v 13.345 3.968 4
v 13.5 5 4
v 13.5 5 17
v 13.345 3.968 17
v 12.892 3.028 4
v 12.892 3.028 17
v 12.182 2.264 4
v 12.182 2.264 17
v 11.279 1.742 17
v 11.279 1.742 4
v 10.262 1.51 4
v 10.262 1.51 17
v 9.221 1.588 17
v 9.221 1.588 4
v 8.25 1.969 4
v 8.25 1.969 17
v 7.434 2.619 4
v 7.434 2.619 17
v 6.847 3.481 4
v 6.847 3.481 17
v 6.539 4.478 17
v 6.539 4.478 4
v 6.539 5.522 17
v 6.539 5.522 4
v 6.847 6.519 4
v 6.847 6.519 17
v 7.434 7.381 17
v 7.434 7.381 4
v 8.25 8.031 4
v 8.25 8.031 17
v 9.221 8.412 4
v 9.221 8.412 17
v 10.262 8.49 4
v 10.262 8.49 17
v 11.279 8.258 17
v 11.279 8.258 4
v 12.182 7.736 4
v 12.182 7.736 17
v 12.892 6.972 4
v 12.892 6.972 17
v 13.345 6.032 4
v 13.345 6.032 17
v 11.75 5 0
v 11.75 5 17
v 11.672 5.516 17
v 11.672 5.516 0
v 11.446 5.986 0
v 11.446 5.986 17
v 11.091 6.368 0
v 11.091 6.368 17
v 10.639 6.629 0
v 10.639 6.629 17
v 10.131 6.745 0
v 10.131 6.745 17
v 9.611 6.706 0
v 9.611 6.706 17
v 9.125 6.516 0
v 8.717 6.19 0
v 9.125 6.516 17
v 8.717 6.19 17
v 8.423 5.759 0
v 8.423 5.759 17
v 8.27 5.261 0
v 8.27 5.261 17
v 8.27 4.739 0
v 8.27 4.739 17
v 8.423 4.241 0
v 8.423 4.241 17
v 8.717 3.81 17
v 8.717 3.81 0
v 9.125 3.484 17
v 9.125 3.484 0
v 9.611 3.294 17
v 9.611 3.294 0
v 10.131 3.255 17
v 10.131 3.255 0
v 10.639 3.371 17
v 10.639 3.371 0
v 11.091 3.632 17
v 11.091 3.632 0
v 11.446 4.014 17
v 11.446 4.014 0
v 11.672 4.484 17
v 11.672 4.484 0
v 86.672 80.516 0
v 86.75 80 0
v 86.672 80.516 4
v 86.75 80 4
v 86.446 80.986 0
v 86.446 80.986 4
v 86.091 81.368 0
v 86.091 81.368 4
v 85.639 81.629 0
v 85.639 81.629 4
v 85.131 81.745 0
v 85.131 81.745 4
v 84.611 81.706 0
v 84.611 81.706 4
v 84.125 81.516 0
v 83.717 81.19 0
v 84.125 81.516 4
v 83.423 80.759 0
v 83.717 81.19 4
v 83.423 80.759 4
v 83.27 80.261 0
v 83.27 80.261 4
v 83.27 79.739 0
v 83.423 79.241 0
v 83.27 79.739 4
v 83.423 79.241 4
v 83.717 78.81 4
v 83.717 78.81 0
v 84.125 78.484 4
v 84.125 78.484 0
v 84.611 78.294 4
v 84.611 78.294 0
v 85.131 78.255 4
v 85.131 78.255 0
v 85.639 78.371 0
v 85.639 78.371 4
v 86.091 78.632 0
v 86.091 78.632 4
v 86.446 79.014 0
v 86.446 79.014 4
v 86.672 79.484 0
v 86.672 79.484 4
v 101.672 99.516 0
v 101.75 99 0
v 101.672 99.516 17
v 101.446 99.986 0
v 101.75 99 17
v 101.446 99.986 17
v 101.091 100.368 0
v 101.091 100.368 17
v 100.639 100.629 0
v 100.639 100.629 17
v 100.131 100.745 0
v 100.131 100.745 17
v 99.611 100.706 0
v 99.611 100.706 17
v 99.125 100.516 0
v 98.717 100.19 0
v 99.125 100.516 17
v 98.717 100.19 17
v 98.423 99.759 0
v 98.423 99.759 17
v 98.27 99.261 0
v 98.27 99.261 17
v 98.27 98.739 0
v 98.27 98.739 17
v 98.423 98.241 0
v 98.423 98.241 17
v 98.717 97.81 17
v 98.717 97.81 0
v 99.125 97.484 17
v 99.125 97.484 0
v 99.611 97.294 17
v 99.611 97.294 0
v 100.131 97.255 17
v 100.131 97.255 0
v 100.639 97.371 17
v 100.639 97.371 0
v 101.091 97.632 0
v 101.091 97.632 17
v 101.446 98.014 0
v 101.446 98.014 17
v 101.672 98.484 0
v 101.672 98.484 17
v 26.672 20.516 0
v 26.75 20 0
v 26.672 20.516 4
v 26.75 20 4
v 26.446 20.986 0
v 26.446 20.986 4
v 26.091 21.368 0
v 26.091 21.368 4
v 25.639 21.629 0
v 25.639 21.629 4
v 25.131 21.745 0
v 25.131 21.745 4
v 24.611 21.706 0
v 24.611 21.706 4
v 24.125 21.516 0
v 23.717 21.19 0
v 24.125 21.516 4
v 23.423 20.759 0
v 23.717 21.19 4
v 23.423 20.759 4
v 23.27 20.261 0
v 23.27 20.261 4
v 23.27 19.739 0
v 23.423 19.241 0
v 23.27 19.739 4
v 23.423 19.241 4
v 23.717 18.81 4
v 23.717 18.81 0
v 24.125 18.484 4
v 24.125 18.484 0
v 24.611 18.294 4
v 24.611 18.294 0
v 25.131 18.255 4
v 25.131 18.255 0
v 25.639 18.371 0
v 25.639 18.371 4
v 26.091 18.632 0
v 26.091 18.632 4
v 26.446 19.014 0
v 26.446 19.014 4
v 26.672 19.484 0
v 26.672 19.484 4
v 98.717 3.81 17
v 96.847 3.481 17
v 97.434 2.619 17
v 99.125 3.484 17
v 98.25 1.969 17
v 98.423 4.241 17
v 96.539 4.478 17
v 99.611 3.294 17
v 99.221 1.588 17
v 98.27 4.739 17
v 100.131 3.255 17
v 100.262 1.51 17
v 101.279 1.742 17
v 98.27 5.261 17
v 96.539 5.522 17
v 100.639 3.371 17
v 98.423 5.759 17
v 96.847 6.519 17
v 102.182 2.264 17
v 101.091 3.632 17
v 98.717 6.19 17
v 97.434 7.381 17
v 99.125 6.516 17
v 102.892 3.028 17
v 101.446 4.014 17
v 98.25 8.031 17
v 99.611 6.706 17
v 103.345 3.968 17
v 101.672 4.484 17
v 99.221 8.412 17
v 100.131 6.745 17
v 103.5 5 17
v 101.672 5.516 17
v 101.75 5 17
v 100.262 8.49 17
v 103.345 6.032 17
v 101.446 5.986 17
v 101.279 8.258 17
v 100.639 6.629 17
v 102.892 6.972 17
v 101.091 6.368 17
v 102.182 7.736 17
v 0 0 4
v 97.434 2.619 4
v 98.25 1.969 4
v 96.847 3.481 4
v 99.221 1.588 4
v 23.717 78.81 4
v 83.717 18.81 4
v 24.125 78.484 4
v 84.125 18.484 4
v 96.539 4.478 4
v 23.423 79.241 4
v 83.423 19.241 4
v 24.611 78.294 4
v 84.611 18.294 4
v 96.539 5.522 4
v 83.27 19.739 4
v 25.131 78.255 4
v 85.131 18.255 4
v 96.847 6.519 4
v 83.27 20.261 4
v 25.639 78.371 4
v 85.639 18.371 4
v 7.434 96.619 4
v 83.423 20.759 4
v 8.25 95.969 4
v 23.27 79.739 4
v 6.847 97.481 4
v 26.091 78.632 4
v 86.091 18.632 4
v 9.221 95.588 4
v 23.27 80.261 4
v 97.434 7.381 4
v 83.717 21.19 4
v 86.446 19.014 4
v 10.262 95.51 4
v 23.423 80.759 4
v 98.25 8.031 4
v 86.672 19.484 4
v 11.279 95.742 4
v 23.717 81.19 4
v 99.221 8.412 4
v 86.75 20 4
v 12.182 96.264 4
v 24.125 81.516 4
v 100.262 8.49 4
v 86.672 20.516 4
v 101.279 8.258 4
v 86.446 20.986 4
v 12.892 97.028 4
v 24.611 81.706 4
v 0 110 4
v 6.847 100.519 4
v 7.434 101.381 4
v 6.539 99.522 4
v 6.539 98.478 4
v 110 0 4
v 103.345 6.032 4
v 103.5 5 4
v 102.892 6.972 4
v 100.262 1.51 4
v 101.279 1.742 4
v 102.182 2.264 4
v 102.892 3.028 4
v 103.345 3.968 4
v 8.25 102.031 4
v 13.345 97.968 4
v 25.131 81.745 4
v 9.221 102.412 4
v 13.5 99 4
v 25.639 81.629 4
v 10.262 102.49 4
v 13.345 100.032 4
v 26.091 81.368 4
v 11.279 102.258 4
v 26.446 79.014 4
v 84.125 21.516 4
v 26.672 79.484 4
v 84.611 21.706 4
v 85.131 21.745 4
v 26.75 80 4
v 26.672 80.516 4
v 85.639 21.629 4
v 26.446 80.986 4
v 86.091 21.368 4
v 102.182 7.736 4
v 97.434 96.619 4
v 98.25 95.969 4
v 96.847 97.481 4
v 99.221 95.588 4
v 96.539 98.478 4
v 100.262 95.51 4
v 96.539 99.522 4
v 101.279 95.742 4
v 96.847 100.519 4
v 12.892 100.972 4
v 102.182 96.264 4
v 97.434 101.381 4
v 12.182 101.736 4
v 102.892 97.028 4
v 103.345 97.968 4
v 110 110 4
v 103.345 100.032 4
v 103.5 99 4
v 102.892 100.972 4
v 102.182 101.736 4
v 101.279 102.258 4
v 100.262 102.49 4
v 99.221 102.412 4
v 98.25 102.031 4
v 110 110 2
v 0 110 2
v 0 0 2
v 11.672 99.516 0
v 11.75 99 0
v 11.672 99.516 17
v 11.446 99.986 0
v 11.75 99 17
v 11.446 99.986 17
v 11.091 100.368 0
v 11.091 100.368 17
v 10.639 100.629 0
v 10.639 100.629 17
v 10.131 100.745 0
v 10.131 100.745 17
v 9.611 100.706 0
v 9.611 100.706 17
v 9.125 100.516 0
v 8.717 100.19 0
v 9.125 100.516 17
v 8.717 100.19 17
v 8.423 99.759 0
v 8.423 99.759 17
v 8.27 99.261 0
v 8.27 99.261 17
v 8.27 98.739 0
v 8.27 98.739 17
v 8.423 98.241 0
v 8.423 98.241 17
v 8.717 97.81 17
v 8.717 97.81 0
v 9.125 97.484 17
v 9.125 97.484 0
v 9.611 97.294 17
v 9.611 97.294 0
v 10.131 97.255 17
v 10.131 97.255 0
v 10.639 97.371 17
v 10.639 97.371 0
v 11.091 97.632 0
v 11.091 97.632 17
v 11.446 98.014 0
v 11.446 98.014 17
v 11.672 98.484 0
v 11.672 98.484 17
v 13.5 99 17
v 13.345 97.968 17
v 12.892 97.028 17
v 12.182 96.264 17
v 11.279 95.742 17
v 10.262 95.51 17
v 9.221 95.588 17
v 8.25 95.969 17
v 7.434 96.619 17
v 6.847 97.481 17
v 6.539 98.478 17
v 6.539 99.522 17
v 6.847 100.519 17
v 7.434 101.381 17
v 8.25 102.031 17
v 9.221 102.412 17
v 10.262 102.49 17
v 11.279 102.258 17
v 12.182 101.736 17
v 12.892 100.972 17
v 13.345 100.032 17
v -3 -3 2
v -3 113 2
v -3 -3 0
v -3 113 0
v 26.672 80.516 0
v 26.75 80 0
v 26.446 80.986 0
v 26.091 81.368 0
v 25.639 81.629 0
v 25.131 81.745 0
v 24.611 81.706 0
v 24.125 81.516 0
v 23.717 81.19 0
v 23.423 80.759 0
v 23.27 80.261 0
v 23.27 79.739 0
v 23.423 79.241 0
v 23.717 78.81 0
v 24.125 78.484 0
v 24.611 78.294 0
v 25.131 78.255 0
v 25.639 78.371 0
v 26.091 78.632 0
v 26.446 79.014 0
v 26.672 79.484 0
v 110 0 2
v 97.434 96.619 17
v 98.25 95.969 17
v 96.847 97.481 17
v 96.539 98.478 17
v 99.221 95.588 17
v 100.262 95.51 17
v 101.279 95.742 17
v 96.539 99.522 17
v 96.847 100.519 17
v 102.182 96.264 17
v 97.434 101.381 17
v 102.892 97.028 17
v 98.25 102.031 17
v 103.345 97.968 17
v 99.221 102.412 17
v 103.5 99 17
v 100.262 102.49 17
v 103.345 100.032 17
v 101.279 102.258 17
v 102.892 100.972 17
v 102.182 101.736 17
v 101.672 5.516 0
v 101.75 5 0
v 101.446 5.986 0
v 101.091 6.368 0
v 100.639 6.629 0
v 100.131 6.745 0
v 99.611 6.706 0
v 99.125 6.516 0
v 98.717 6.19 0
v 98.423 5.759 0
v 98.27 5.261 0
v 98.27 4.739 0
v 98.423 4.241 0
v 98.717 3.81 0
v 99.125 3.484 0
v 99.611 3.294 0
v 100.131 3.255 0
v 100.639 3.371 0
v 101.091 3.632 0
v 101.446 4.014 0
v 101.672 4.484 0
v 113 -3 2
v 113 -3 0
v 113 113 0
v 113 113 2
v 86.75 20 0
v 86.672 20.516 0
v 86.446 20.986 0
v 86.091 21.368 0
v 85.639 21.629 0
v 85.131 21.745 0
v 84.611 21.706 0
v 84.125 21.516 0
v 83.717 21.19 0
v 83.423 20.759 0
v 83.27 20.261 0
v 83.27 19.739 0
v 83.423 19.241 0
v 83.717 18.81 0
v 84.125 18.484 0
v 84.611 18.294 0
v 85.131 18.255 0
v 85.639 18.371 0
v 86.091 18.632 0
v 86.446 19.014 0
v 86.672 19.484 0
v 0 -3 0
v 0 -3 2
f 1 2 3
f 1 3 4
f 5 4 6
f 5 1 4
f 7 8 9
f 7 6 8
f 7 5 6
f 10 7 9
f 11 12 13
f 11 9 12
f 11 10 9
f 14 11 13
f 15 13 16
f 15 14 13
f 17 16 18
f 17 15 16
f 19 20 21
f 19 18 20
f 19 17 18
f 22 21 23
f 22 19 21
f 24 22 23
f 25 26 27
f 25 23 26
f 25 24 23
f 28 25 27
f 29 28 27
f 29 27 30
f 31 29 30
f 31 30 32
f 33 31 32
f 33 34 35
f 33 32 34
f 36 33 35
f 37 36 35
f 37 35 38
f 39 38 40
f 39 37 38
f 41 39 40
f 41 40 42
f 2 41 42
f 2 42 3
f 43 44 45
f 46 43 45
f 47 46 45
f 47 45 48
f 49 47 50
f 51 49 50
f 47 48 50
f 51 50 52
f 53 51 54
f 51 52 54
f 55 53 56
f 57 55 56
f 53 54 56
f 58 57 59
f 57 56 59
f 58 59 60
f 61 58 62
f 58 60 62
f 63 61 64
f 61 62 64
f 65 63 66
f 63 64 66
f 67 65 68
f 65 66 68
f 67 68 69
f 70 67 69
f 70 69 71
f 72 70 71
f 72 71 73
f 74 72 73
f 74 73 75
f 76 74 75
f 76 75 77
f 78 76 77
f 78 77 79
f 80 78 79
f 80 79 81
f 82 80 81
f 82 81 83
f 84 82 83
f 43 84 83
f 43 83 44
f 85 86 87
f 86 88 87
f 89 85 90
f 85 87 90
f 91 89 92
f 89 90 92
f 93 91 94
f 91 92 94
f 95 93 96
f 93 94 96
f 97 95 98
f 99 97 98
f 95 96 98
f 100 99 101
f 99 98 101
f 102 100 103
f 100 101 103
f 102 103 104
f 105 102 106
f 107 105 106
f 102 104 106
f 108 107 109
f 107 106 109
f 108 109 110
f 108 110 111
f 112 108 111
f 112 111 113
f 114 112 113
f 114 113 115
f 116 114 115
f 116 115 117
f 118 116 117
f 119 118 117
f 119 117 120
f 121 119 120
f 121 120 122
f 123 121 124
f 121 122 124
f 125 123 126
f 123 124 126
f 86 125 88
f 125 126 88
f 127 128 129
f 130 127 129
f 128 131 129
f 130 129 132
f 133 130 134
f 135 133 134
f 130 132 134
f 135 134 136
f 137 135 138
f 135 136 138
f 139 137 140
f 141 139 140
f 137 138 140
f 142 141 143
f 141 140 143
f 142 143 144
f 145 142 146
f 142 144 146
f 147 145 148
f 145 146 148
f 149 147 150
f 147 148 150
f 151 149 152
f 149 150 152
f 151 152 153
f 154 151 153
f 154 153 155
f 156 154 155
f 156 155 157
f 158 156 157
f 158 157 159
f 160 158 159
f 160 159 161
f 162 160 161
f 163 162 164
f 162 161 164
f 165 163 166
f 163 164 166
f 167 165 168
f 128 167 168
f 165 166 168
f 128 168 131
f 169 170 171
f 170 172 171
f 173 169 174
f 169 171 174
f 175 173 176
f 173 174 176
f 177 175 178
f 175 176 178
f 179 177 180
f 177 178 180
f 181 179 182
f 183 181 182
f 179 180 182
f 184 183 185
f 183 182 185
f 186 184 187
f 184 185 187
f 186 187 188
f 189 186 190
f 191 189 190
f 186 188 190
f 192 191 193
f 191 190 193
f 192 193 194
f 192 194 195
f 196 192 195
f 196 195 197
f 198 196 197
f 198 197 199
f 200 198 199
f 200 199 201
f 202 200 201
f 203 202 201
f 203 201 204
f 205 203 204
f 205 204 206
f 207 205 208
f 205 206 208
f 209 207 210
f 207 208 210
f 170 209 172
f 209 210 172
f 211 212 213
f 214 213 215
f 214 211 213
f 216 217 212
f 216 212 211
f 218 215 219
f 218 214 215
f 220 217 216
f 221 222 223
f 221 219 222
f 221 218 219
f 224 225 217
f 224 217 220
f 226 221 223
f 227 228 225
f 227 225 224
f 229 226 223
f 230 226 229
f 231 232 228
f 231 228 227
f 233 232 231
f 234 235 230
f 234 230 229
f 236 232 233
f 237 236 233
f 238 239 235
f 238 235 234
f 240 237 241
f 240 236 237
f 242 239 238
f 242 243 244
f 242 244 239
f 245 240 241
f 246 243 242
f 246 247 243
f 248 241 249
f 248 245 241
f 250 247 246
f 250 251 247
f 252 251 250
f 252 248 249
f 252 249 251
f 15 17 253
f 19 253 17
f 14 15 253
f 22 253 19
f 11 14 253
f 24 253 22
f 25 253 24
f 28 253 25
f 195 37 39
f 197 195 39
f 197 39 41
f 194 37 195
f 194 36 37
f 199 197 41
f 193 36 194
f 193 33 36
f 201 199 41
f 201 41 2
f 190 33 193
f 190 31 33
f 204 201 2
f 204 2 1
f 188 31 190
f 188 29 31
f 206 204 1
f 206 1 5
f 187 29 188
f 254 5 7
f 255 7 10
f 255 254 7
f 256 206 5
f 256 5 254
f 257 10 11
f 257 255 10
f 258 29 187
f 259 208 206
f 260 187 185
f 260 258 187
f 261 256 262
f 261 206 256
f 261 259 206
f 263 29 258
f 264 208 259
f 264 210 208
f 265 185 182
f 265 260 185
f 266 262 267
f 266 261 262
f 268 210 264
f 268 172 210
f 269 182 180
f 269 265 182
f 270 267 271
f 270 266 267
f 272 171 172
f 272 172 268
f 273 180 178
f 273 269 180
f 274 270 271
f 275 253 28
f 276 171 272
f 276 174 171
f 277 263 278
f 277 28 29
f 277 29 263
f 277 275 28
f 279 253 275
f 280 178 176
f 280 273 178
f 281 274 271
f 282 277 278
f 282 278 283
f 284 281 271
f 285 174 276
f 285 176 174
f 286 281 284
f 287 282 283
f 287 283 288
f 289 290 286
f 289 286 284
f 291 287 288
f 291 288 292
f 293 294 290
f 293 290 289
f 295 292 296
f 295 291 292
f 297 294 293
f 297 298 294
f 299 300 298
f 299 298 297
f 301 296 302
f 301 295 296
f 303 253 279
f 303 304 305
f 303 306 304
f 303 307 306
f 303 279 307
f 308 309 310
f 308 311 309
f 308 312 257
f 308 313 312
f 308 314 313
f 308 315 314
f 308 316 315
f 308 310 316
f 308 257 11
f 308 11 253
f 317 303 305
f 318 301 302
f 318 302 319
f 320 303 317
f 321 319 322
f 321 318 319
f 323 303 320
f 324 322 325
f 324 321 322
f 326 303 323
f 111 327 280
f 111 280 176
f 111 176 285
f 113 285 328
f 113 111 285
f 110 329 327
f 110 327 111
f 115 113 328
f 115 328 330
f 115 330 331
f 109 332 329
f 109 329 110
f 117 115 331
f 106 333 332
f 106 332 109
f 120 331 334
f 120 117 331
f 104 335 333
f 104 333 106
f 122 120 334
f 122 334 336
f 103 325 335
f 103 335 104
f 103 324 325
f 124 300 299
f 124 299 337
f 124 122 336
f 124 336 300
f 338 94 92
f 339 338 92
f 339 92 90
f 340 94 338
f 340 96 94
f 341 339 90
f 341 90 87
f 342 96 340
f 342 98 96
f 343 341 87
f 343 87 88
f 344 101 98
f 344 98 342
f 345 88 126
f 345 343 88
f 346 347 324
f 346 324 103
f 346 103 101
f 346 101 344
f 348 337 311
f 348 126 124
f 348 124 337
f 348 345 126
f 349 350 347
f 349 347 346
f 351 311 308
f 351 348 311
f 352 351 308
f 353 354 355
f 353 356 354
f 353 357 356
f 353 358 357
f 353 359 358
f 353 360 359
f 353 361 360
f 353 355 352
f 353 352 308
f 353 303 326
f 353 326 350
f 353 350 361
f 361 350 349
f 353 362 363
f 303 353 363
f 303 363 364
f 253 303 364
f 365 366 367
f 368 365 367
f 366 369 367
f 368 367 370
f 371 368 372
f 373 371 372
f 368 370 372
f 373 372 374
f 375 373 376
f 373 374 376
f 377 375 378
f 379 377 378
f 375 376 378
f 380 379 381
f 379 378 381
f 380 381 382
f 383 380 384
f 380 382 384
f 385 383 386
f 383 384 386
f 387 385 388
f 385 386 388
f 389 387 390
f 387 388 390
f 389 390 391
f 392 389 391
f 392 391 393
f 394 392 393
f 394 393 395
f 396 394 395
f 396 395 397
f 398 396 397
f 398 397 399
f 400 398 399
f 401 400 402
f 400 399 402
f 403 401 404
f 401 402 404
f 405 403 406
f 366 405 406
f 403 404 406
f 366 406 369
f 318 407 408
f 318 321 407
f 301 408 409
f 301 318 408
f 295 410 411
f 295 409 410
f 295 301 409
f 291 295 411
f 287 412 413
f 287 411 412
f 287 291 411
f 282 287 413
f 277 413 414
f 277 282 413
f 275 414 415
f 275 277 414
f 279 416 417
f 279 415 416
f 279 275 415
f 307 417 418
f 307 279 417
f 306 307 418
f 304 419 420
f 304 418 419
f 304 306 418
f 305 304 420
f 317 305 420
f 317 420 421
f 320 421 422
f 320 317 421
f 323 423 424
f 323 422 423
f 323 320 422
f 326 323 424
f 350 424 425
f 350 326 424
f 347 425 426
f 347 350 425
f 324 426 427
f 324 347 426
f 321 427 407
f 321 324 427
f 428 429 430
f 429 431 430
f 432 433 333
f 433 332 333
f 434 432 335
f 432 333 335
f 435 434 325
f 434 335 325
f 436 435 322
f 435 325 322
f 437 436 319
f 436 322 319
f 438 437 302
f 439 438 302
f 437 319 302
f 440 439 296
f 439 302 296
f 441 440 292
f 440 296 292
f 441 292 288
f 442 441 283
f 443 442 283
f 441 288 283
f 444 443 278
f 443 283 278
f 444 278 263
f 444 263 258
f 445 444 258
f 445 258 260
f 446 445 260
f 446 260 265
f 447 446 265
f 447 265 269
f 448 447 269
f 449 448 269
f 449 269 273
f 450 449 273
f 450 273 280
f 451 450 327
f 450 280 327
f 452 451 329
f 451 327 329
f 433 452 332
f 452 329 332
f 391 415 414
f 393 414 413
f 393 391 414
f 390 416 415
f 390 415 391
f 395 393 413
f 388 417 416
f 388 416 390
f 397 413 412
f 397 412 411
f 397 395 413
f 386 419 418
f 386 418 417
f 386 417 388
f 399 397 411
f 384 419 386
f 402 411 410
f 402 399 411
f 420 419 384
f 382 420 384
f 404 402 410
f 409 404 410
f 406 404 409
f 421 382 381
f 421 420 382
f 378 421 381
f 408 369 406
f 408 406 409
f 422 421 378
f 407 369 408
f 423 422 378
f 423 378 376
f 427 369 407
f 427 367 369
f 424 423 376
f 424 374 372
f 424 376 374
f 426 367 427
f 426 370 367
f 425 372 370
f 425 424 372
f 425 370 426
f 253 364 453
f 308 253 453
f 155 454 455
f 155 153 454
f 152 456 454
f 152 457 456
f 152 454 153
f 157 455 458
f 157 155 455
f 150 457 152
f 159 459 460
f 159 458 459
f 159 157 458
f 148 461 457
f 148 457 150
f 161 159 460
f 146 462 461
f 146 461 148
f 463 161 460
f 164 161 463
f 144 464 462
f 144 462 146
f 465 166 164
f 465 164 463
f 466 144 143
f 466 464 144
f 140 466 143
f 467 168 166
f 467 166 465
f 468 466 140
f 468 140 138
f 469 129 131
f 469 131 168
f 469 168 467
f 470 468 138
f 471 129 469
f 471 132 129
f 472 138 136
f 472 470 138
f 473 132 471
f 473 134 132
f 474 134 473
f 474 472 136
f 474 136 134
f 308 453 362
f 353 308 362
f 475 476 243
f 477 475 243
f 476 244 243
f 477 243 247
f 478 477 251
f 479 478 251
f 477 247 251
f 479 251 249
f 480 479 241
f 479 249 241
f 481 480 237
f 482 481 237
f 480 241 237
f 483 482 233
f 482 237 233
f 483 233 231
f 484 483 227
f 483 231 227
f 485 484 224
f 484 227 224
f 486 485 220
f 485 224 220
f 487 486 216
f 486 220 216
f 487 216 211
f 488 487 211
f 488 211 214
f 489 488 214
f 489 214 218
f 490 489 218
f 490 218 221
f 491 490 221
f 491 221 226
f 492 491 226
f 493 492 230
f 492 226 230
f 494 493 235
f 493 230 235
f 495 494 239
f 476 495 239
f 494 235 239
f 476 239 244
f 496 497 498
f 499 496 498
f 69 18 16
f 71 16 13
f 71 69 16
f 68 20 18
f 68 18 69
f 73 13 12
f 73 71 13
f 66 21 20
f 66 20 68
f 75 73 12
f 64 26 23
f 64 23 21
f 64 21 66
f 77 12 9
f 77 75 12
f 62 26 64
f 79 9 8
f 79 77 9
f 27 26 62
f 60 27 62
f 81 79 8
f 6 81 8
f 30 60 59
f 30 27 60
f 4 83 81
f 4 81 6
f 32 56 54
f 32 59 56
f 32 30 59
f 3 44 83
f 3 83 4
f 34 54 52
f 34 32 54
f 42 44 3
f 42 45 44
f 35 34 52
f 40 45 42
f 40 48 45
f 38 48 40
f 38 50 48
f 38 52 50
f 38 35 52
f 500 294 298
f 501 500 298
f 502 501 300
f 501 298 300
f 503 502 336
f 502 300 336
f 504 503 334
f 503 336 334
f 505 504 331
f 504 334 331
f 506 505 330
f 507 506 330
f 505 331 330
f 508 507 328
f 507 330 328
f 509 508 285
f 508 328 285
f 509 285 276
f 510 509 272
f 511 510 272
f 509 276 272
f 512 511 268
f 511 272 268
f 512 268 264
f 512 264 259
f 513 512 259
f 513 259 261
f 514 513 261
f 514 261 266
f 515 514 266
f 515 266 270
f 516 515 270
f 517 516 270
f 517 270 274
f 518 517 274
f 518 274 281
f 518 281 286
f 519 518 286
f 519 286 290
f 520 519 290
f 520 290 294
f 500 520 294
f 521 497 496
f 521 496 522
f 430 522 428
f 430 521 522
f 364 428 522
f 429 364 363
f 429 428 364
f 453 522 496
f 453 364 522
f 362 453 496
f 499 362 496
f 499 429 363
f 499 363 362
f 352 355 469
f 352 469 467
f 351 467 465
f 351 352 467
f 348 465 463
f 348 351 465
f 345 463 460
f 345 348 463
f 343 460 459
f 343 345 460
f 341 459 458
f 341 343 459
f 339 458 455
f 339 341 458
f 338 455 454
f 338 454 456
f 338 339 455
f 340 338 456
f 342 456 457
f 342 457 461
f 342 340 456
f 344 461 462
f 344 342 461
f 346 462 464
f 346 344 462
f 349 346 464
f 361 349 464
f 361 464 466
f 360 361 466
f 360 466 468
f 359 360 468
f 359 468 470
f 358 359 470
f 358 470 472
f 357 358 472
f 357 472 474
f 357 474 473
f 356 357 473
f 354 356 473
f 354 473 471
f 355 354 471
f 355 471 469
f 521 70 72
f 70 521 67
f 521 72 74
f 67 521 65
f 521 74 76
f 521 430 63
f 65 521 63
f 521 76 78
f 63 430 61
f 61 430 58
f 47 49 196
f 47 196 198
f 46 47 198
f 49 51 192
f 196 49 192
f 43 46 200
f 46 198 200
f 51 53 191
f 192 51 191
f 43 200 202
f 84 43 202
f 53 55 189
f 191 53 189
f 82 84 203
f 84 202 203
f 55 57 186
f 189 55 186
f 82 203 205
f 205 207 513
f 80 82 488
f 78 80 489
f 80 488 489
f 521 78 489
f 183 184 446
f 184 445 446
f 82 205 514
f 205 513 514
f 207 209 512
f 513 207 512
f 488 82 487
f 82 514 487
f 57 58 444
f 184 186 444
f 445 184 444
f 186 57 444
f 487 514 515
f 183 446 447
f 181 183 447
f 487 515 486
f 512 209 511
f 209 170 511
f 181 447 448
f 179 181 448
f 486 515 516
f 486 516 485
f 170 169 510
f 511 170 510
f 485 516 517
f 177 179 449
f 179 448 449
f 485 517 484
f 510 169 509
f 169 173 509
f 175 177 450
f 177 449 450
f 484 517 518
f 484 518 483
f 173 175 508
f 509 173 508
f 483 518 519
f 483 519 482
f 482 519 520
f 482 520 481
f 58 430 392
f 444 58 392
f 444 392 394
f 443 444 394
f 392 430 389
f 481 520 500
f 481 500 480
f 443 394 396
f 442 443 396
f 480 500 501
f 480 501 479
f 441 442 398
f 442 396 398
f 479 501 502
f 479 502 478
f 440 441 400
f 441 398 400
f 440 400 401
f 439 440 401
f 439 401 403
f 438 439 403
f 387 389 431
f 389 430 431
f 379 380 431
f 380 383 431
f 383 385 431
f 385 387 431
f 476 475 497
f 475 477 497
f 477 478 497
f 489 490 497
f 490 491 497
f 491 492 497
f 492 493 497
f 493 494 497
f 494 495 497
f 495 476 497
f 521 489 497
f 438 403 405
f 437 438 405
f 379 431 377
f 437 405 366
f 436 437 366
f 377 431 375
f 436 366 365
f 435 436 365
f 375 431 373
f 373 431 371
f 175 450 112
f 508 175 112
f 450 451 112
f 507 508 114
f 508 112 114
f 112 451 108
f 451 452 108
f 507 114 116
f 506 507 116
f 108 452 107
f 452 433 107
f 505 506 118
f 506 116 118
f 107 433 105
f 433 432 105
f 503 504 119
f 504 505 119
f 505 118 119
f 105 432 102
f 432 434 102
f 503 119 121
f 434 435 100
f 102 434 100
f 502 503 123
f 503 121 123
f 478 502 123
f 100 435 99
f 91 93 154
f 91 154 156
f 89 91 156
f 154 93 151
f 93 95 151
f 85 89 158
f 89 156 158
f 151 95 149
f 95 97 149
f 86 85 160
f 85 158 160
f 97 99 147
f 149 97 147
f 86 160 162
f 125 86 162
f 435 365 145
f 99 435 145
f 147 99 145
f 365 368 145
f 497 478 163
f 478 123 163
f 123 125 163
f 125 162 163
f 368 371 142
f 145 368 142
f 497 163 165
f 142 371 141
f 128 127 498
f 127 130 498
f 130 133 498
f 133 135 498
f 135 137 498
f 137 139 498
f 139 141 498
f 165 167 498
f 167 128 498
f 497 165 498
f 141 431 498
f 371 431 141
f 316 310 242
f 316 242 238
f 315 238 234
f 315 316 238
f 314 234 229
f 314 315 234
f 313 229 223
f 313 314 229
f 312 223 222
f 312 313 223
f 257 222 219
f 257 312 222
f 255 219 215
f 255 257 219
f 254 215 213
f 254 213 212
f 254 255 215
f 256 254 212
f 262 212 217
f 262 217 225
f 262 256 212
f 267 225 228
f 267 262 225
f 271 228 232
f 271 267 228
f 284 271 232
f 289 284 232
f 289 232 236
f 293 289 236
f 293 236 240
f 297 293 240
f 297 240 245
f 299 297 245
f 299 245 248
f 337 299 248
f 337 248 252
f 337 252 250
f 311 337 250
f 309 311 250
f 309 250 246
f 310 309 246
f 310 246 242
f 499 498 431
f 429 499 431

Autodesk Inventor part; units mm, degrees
ref_plane "YZ Plane" through (0, 0, 0) normal (1, 0, 0) x (0, 1, 0)
ref_plane "XZ Plane" through (0, 0, 0) normal (0, 1, 0) x (-1, 0, 0)
ref_plane "XY Plane" through (0, 0, 0) normal (0, 0, 1) x (1, 0, 0)
sketch "Sketch1" plane through (0, 0, 0) normal (0, 0, 1) x (1, 0, 0)
  line L0 (0, 0) -> (110, 0)
  line L1 (110, 0) -> (110, 110)
  line L2 (110, 110) -> (0, 110)
  line L3 (0, 110) -> (0, 0)
  line L4 (0, 0) -> (0, -3)
  line L5 (0, -3) -> (-3, -3)
  line L6 (-3, -3) -> (113, -3)
  line L7 (113, -3) -> (113, 113)
  line L8 (113, 113) -> (-3, 113)
  line L9 (-3, 113) -> (-3, -3)
  dimension "d0" = 110
  dimension "d1" = 110
  dimension "d2" = 3
  dimension "d3" = 3
  dimension "d4" = 116
  dimension "d5" = 116
extrude "Extrusion1" add sketch "Sketch1" along normal blind 4 contours L3 L2 L1 L0
extrude "Extrusion2" add sketch "Sketch1" along normal blind 2
sketch "Sketch2" plane through (0, 0, 4) normal (0, 0, 1) x (1, 0, 0)
  line L0 (0, 0) -> (110, 0) projected
  line L1 (55, 0) -> (55, 5)
  line L2 (55, 5) -> (10, 5)
  line L3 (10, 5) -> (100, 5)
  line L4 (100, 5) -> (100, 99)
  line L5 (100, 99) -> (10, 99)
  circle A0 centre (10, 99) radius 3.5
  circle A1 centre (100, 99) radius 3.5
  circle A2 centre (100, 5) radius 3.5
  circle A3 centre (10, 5) radius 3.5
  dimension "d10" = 5
  dimension "d11" = 45
  dimension "d12" = 90
  dimension "d13" = 94
  dimension "d14" = 90
  dimension "d15" = 7
  dimension "d16" = 7
  dimension "d17" = 7
  dimension "d18" = 7
extrude "Extrusion3" add sketch "Sketch2" along normal blind 13
sketch "Sketch3" plane through (10, 99, 17) normal (0, 0, 1) x (1, 0, 0)
  circle A0 centre (0, -94) radius 3.5 projected
  circle A1 centre (0, -94) radius 1.75
  circle A2 centre (90, -94) radius 3.5 projected
  circle A3 centre (90, -94) radius 1.75
  circle A4 centre (90, 0) radius 3.5 projected
  circle A5 centre (90, 0) radius 1.75
  circle A6 centre (0, 0) radius 1.75
  point P0 (-10, -99)
  dimension "d21" = 3.5
  dimension "d22" = 3.5
  dimension "d23" = 3.5
  dimension "d24" = 3.5
extrude "Extrusion4" cut sketch "Sketch3" against normal through all contours A1 | A3 | A5 | A6
sketch "Sketch4" plane through (0, 0, 4) normal (0, 0, 1) x (1, 0, 0)
  line L0 (0, 0) -> (110, 0) projected
  line L1 (55, 0) -> (55, 20)
  line L2 (55, 20) -> (85, 20)
  line L3 (85, 20) -> (85, 80)
  line L4 (85, 80) -> (25, 80)
  line L5 (25, 80) -> (25, 20)
  circle A0 centre (25, 80) radius 1.75
  circle A1 centre (85, 80) radius 1.75
  circle A2 centre (85, 20) radius 1.75
  circle A3 centre (25, 20) radius 1.75
  dimension "d27" = 20
  dimension "d28" = 30
  dimension "d29" = 60
  dimension "d30" = 60
  dimension "d31" = 60
  dimension "d32" = 3.5
  dimension "d33" = 3.5
  dimension "d34" = 3.5
  dimension "d35" = 3.5
extrude "Extrusion5" cut sketch "Sketch4" against normal blind 15
properties part number "nuccase_top"
